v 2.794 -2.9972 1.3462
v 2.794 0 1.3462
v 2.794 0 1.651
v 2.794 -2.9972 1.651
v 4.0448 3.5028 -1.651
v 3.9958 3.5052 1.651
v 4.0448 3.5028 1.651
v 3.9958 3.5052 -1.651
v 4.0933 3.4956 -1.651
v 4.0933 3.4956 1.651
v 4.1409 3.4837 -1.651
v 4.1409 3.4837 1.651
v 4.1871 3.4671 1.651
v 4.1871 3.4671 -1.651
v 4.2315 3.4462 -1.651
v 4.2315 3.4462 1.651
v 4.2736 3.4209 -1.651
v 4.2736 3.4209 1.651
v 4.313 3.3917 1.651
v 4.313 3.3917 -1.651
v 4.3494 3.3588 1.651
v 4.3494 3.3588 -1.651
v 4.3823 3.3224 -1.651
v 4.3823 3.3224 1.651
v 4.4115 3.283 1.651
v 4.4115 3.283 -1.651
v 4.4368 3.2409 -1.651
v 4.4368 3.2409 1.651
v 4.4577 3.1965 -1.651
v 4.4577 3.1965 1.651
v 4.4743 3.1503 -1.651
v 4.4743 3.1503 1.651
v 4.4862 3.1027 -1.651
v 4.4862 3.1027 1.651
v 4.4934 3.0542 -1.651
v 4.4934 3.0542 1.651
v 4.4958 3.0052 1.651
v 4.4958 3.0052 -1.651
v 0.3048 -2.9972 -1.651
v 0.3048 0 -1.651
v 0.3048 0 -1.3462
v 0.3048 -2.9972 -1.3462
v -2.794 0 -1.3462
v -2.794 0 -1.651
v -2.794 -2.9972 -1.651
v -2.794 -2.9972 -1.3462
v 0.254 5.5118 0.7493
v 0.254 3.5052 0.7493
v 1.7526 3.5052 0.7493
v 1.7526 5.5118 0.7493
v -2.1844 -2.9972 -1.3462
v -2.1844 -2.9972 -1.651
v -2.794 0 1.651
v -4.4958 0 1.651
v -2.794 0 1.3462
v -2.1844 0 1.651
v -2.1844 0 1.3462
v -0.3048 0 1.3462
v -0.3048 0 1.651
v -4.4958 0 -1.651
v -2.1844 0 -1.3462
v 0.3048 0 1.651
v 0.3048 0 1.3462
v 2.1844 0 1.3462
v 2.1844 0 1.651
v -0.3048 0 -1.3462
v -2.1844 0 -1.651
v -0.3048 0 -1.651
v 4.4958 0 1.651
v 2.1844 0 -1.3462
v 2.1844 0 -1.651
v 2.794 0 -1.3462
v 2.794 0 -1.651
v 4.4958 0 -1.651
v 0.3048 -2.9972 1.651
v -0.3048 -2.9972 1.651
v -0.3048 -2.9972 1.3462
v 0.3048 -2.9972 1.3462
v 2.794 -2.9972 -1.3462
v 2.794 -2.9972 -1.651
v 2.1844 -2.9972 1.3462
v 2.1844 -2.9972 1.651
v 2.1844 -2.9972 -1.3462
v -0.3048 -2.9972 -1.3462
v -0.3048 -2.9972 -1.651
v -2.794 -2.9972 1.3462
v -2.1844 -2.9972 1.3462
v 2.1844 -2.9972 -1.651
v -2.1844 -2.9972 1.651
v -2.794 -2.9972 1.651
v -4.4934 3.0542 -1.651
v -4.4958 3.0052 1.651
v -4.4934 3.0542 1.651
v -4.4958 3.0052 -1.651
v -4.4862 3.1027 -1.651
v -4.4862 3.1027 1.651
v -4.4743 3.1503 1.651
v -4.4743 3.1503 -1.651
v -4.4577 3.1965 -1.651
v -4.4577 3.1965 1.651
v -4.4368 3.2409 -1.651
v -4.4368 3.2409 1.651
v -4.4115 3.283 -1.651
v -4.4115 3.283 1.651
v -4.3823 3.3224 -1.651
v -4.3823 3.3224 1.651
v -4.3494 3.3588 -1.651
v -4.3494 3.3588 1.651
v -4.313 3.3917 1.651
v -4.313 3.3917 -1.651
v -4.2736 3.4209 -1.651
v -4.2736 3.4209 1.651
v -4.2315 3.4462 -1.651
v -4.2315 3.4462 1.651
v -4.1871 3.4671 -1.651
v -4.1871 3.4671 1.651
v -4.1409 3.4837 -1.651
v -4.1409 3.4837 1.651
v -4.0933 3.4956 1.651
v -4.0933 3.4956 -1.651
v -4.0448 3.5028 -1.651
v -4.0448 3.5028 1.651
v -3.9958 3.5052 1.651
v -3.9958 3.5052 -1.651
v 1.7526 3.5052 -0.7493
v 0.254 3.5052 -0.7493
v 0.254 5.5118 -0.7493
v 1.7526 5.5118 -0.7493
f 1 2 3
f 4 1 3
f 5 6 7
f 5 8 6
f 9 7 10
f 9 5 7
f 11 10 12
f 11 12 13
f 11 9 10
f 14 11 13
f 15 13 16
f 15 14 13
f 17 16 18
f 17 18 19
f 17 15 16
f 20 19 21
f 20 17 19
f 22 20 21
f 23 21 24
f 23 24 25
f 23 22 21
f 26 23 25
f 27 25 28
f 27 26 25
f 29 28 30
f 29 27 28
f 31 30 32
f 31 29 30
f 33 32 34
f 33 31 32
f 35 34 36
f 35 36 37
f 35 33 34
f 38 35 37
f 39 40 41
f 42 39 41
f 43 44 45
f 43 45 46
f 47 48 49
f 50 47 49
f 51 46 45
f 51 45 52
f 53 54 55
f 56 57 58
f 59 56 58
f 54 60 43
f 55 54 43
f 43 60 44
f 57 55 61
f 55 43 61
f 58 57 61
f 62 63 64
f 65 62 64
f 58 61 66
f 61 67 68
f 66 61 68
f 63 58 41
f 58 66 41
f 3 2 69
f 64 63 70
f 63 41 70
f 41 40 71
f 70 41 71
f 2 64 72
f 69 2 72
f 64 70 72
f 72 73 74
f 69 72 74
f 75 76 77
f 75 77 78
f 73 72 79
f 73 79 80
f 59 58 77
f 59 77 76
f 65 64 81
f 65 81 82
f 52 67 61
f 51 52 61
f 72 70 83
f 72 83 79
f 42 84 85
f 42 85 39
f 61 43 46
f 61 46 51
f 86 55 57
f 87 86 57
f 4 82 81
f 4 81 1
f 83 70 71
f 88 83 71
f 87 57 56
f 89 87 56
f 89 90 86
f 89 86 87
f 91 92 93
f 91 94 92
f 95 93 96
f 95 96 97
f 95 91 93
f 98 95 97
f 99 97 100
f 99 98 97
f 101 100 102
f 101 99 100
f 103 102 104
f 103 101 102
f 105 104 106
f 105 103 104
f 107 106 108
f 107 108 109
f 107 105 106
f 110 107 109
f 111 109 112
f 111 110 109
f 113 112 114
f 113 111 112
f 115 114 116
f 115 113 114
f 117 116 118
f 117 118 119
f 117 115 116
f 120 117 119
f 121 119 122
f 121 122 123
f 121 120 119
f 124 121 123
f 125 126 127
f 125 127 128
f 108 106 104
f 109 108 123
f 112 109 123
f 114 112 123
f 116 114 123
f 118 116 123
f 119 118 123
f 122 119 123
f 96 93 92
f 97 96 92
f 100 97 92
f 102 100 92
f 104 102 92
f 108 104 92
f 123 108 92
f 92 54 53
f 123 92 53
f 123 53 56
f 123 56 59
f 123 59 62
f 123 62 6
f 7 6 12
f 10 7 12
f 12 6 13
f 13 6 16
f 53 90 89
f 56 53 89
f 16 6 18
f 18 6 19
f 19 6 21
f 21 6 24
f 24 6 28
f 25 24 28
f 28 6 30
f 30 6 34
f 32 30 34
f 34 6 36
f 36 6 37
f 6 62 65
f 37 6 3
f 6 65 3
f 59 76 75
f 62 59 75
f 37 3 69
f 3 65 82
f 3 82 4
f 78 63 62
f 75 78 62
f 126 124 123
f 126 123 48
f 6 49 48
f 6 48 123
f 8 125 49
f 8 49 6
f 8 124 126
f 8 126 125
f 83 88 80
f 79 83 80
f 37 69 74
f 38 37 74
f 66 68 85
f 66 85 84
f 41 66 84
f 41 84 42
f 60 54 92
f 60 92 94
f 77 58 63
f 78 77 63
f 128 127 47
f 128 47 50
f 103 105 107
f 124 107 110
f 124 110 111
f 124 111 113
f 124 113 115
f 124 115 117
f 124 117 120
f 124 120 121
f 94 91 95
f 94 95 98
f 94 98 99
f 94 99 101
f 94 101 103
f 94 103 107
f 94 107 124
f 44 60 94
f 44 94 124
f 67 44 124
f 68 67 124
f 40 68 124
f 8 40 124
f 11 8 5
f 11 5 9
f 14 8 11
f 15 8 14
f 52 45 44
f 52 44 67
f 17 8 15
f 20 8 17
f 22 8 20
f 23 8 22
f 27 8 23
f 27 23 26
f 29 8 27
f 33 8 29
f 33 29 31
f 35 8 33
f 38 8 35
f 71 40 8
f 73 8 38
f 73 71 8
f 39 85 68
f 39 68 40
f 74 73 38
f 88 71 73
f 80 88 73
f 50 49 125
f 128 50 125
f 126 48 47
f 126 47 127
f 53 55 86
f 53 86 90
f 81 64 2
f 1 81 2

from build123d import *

# Parameters (mm, degrees)
SKETCH1_W               = 8.9916
SKETCH1_H               = 3.302
BOSS_EXTRUDE1_DEPTH     = 3.5052
SKETCH2_W               = 1.4986
SKETCH2_H               = 1.4986
BOSS_EXTRUDE2_DEPTH     = 2.0066
SKETCH3_W               = 0.6096
SKETCH3_H               = 0.3048
BOSS_EXTRUDE3_DEPTH     = 2.9972
LPATTERN1_COUNT         = 3
LPATTERN1_PITCH         = 2.4892
MIRROR1_COPY_1_SKETCH_W = 0.6096
MIRROR1_COPY_1_SKETCH_H = 0.3048
MIRROR1_COPY_1_DEPTH    = 2.9972
MIRROR1_COPY_2_SKETCH_W = 0.6096
MIRROR1_COPY_2_SKETCH_H = 0.3048
MIRROR1_COPY_2_DEPTH    = 2.9972
FILLET1_R               = 0.5


with BuildPart() as part:
    # Sketch1 → Boss-Extrude1 (new body)
    with BuildSketch(Plane(origin=(0, 0, 0), x_dir=(1, 0, 0), z_dir=(0, 1, 0))):
        Rectangle(SKETCH1_W, SKETCH1_H)
    extrude(amount=BOSS_EXTRUDE1_DEPTH)

    # Sketch2 → Boss-Extrude2 (add)
    with BuildSketch(Plane(origin=(0, 3.5052, 0), x_dir=(1, 0, 0), z_dir=(0, 1, 0))):
        with Locations((1.0033, 0)):
            Rectangle(SKETCH2_W, SKETCH2_H)
    extrude(amount=BOSS_EXTRUDE2_DEPTH)

    # Sketch3 → Boss-Extrude3 (add)
    with BuildSketch(Plane.XZ):
        with Locations((2.4892, 1.4986)):
            Rectangle(SKETCH3_W, SKETCH3_H)
    boss_extrude3 = extrude(amount=BOSS_EXTRUDE3_DEPTH)

    # LPattern1: Boss-Extrude3 ×3
    with Locations(*[(-i * LPATTERN1_PITCH, 0, 0) for i in range(1, LPATTERN1_COUNT)]):
        add(boss_extrude3)

    # Mirror1: Boss-Extrude3 across plane
    add(boss_extrude3.mirror(Plane.XY))

    # Mirror1 copy 1 sketch → Mirror1 copy 1 (add)
    with BuildSketch(Plane(origin=(-2.4892, 0, 0), x_dir=(1, 0, 0), z_dir=(0, -1, 0))):
        with Locations((2.4892, -1.4986)):
            Rectangle(MIRROR1_COPY_1_SKETCH_W, MIRROR1_COPY_1_SKETCH_H)
    extrude(amount=MIRROR1_COPY_1_DEPTH)

    # Mirror1 copy 2 sketch → Mirror1 copy 2 (add)
    with BuildSketch(Plane(origin=(-4.9784, 0, 0), x_dir=(1, 0, 0), z_dir=(0, -1, 0))):
        with Locations((2.4892, -1.4986)):
            Rectangle(MIRROR1_COPY_2_SKETCH_W, MIRROR1_COPY_2_SKETCH_H)
    extrude(amount=MIRROR1_COPY_2_DEPTH)

    # Fillet1
    fillet1_edges = [part.edges().sort_by_distance(p)[0] for p in [
        (4.4958, 3.5052, 0),
        (-4.4958, 3.5052, 0),
    ]]
    fillet(fillet1_edges, radius=FILLET1_R)


solid = part.part
